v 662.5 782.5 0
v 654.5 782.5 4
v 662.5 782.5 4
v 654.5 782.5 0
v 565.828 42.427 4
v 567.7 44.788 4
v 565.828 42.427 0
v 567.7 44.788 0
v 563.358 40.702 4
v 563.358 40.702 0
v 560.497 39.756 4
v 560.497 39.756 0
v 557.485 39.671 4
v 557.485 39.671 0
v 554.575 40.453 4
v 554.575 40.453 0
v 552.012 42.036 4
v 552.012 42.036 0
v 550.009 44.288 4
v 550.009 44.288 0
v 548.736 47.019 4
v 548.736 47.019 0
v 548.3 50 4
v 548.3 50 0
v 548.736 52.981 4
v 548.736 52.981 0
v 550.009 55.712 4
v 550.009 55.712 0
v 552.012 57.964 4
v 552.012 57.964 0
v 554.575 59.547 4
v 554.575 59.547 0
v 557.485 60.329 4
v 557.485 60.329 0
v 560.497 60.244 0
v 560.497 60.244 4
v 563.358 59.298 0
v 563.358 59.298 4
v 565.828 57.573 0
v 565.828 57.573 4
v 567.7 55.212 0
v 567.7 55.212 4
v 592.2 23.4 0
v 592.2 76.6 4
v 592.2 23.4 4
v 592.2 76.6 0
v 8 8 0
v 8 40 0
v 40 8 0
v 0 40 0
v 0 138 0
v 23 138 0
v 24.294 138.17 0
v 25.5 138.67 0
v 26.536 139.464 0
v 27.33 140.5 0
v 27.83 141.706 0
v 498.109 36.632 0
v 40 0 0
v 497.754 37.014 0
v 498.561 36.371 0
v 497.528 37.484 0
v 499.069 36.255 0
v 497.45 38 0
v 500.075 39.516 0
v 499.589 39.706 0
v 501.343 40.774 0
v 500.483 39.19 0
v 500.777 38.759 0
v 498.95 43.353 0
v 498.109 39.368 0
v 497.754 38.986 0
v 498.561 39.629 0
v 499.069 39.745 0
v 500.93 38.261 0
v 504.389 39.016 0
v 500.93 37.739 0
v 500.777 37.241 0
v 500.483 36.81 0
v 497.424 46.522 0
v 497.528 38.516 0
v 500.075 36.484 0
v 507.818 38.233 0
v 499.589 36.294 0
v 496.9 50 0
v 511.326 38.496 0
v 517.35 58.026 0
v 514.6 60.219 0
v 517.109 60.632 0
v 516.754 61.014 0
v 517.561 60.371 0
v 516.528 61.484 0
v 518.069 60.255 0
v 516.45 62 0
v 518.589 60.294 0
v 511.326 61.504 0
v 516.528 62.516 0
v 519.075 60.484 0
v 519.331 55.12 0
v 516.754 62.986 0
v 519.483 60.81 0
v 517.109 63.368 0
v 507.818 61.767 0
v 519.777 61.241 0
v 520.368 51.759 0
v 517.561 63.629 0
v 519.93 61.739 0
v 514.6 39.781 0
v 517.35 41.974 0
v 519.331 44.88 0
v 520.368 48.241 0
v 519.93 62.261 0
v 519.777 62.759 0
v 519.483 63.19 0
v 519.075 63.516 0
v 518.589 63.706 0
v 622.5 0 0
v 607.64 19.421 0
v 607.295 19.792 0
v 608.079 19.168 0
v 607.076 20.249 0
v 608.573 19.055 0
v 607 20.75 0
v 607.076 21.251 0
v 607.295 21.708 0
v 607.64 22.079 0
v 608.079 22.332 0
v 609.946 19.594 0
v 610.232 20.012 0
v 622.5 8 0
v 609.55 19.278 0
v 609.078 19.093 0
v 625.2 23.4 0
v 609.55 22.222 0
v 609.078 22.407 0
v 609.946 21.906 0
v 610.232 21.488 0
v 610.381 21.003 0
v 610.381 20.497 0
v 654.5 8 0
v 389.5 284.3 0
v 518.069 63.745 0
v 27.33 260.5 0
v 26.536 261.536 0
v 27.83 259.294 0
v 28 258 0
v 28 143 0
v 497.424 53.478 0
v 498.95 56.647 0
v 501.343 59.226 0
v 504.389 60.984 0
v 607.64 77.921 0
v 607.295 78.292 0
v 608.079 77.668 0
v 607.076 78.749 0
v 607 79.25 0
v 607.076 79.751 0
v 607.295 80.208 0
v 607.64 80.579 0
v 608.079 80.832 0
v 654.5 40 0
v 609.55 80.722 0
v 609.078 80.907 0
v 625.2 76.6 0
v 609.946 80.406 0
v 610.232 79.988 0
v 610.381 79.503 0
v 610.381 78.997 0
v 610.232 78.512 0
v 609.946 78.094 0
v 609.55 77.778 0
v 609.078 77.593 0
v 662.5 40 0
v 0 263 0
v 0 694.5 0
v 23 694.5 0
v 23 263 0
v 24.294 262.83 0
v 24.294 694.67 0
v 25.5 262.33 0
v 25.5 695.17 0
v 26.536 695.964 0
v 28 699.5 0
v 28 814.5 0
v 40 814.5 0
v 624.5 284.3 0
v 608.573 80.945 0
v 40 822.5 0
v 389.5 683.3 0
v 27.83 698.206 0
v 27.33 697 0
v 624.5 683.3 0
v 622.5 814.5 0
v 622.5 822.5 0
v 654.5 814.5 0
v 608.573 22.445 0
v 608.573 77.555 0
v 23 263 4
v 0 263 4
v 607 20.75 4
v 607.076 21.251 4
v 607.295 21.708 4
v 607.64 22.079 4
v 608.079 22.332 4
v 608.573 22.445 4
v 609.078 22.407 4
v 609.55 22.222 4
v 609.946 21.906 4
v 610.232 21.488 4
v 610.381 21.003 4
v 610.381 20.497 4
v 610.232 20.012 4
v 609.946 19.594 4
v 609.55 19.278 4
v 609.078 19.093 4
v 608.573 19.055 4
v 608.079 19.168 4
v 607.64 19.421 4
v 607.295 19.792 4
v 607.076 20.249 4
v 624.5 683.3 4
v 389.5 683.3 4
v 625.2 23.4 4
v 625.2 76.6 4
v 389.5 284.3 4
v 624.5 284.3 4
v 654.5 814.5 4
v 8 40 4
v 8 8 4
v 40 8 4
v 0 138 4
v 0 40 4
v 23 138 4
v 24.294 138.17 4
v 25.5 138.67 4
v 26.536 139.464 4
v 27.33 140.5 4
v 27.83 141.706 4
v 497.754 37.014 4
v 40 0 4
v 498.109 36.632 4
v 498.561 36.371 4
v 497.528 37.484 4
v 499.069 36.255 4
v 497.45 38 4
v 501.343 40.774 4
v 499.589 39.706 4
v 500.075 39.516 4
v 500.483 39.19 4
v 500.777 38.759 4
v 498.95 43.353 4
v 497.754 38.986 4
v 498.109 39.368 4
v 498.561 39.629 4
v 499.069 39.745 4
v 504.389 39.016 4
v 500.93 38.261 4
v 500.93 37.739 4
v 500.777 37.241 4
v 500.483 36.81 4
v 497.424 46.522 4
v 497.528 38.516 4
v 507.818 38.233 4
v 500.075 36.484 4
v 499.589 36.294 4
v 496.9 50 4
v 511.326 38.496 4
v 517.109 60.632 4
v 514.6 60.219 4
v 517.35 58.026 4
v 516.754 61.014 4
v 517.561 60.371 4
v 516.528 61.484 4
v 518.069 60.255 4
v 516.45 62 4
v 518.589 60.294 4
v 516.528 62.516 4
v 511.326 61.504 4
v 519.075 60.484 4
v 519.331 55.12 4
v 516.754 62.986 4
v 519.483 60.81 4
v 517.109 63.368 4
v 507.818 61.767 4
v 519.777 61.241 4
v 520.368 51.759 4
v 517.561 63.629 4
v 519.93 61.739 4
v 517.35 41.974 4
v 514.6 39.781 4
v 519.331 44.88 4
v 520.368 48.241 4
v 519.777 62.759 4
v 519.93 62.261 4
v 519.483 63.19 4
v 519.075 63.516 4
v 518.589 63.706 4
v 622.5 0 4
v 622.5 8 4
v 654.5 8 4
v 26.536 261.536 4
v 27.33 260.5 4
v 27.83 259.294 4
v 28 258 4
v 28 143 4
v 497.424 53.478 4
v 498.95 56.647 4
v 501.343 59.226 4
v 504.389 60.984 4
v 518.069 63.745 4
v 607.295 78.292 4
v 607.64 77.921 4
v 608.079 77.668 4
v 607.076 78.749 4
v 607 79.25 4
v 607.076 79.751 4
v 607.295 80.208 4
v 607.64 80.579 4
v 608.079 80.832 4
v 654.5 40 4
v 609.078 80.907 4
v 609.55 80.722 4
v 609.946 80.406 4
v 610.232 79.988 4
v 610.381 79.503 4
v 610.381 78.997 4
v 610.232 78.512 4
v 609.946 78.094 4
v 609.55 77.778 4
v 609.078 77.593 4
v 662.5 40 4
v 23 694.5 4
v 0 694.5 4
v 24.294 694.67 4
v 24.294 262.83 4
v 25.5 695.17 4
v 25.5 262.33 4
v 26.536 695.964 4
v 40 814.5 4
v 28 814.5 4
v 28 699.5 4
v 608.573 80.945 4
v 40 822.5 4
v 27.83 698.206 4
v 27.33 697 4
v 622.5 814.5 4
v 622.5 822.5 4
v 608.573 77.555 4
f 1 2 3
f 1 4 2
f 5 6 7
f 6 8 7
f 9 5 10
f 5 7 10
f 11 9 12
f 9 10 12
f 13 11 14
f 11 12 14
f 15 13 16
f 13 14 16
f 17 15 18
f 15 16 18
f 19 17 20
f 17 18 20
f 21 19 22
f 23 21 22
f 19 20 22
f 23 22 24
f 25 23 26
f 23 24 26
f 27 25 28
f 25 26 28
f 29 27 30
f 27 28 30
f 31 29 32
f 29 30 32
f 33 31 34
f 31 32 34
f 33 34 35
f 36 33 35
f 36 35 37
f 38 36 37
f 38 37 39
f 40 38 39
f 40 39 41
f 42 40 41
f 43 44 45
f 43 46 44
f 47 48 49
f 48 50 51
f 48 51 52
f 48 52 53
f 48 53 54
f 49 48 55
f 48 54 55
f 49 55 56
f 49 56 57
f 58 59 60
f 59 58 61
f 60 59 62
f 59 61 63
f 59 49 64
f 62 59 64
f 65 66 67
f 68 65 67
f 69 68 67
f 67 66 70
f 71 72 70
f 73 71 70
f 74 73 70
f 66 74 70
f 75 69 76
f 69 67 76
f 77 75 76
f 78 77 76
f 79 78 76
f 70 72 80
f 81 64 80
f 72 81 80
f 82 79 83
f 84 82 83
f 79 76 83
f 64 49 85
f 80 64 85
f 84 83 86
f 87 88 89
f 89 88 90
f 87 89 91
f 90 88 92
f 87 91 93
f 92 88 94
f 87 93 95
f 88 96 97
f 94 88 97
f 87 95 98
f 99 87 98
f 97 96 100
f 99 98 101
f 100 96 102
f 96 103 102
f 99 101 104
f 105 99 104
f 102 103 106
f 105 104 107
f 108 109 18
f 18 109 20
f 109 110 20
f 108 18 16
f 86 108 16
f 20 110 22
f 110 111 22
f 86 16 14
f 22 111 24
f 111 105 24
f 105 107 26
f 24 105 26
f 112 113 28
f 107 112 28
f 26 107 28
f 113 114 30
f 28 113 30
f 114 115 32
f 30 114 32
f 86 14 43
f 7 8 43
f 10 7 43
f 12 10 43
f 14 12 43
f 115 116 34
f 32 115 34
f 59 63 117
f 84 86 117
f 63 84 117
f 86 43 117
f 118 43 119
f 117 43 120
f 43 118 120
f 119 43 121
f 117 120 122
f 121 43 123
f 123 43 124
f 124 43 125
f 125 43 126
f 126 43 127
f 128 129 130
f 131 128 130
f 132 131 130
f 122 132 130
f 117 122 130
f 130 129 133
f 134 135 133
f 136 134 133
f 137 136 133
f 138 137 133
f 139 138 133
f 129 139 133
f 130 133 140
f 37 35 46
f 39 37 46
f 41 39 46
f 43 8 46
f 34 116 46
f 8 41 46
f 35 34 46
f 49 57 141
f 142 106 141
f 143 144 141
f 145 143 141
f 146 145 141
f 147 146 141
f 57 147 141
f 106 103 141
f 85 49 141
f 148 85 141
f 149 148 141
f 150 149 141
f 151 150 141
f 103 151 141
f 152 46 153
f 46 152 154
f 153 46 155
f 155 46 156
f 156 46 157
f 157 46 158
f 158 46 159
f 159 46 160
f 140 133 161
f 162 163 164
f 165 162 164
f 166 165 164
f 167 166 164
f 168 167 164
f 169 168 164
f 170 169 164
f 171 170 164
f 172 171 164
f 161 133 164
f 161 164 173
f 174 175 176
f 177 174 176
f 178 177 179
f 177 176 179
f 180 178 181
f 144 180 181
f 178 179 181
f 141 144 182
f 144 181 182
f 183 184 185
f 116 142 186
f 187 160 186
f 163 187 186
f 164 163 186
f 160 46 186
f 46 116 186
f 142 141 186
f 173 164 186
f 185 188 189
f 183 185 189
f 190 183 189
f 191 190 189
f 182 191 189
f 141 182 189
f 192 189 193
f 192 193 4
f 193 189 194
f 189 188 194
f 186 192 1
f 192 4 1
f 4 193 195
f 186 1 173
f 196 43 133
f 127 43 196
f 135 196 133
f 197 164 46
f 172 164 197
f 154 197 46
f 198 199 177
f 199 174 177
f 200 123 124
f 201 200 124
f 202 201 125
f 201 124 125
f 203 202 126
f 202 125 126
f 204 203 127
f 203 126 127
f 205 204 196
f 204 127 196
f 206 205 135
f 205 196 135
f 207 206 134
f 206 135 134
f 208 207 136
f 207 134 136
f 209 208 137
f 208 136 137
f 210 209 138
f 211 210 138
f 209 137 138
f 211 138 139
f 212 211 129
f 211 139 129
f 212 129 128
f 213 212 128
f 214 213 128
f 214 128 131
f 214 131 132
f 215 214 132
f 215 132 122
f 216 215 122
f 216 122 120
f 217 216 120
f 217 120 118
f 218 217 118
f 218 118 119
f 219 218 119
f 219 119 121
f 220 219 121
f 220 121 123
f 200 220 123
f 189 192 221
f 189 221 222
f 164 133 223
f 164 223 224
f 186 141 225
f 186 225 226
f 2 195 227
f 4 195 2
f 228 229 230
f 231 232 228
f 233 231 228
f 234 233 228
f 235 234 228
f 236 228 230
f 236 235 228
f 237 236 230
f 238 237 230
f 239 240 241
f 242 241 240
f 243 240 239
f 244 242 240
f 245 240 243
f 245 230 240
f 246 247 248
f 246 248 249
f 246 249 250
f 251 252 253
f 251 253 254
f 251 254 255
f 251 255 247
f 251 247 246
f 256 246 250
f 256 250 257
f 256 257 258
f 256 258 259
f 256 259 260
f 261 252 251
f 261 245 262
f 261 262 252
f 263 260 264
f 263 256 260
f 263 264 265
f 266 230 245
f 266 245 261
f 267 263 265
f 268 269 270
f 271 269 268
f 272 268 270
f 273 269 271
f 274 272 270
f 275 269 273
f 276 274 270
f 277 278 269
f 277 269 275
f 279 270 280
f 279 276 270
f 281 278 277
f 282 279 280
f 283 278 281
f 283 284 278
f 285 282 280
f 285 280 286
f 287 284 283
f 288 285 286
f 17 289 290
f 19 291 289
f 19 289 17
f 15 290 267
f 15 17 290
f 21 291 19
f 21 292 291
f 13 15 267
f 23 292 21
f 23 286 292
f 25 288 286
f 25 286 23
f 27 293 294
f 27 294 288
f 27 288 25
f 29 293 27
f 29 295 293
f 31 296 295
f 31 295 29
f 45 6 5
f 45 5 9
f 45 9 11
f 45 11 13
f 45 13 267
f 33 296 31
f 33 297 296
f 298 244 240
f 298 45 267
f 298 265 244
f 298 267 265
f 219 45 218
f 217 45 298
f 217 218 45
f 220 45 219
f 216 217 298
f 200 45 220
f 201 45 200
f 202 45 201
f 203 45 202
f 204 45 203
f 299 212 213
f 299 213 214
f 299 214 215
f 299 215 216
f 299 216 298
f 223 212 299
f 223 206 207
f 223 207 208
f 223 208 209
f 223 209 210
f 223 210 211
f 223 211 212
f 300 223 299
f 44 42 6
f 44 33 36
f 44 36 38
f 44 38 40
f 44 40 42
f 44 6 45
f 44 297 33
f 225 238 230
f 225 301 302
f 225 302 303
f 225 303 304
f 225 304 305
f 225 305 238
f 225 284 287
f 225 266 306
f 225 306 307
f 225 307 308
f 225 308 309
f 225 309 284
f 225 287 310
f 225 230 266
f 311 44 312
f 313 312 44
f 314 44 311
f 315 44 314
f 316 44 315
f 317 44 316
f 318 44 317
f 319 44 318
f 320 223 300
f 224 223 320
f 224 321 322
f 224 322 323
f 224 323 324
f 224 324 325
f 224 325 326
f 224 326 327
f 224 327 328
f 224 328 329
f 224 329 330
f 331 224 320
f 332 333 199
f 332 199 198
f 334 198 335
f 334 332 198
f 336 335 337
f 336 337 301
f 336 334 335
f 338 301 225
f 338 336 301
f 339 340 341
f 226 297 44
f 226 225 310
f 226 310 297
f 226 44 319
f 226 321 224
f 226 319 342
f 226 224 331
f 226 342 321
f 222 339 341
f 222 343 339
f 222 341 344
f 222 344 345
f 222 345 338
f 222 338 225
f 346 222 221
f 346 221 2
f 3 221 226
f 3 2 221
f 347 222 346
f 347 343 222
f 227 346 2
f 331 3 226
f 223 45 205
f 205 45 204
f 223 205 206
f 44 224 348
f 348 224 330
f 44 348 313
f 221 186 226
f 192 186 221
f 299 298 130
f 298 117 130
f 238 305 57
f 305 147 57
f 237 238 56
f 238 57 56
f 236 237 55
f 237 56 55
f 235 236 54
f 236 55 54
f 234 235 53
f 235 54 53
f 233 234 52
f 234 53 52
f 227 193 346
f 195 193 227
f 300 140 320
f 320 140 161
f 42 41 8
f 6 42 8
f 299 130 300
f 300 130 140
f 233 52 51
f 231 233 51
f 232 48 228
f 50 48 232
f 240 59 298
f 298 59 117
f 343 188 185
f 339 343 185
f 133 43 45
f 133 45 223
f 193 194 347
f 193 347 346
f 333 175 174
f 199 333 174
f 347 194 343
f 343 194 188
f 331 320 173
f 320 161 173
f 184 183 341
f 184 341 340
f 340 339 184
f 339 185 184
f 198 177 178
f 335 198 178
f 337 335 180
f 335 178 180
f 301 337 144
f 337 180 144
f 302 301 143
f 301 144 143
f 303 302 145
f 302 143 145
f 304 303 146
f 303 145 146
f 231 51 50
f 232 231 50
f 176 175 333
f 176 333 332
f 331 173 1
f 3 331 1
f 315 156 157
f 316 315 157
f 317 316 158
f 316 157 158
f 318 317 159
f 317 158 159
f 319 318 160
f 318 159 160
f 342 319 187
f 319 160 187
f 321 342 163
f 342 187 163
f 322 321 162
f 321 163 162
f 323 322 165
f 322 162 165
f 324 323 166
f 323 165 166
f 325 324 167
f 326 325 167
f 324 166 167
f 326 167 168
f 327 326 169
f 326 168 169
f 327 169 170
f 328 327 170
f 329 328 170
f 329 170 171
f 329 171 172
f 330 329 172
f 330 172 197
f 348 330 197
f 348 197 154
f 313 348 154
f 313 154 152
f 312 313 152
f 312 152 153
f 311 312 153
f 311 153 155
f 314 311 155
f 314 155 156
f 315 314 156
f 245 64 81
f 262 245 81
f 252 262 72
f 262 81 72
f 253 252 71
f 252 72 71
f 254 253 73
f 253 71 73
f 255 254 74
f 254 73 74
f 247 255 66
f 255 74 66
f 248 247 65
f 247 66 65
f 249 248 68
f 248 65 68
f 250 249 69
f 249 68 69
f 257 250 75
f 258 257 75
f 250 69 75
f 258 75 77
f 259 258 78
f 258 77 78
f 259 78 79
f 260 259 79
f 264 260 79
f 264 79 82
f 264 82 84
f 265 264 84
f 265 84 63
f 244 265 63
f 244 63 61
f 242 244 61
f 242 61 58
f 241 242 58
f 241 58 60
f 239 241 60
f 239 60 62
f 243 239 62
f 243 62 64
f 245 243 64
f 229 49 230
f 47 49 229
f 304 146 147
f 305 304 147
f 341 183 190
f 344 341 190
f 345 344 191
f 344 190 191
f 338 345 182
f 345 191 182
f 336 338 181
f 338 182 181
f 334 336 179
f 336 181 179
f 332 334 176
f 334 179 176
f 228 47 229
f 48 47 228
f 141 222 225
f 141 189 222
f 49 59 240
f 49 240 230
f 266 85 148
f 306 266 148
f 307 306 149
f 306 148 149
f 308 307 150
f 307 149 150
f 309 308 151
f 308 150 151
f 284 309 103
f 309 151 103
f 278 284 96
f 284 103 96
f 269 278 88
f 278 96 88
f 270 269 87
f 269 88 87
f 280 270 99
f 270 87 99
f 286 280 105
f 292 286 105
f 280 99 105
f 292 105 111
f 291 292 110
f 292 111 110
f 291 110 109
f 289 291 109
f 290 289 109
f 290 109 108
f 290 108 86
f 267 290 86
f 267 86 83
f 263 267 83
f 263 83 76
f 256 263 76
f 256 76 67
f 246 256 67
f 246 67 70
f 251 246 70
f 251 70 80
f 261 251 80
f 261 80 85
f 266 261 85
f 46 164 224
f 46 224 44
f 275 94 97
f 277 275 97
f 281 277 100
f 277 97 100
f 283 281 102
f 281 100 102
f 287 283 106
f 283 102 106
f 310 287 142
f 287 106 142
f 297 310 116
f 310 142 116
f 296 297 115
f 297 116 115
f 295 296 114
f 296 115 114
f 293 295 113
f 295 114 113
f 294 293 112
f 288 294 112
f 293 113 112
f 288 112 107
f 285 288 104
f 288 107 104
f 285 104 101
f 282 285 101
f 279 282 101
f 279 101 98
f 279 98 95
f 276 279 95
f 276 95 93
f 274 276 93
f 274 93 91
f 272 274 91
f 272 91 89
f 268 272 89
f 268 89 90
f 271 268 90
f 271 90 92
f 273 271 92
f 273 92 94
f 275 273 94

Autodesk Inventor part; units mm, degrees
ref_plane "YZ Plane" through (0, 0, 0) normal (1, 0, 0) x (0, 1, 0)
ref_plane "XZ Plane" through (0, 0, 0) normal (0, 1, 0) x (-1, 0, 0)
ref_plane "XY Plane" through (0, 0, 0) normal (0, 0, 1) x (1, 0, 0)
sketch "Skizze1" plane through (0, 0, 0) normal (0, 0, 1) x (1, 0, 0)
  line L0 (0, 0) -> (662.5, 0)
  line L1 (662.5, 0) -> (662.5, 822.5)
  line L2 (662.5, 822.5) -> (0, 822.5)
  line L3 (0, 822.5) -> (0, 0)
  line L4 (0, 822.5) -> (40, 822.5)
  line L5 (40, 822.5) -> (40, 814.5)
  line L6 (40, 814.5) -> (0, 814.5)
  line L7 (0, 814.5) -> (0, 822.5)
  line L8 (0, 822.5) -> (8, 822.5)
  line L9 (8, 822.5) -> (8, 782.5)
  line L10 (8, 782.5) -> (0, 782.5)
  line L11 (0, 782.5) -> (0, 822.5)
  line L12 (0, 411.25) -> (662.5, 411.25) construction
  line L13 (331.25, 822.5) -> (331.25, 0) construction
  line L14 (0, 0) -> (40, 0)
  line L15 (40, 0) -> (40, 8)
  line L16 (40, 8) -> (0, 8)
  line L17 (0, 8) -> (0, 0)
  line L18 (0, 0) -> (8, 0)
  line L19 (8, 0) -> (8, 40)
  line L20 (8, 40) -> (0, 40)
  line L21 (0, 40) -> (0, 0)
  line L22 (662.5, 822.5) -> (662.5, 0)
  line L23 (662.5, 822.5) -> (622.5, 822.5)
  line L24 (622.5, 822.5) -> (622.5, 814.5)
  line L25 (622.5, 814.5) -> (662.5, 814.5)
  line L26 (662.5, 814.5) -> (662.5, 822.5)
  line L27 (662.5, 822.5) -> (654.5, 822.5)
  line L28 (654.5, 822.5) -> (654.5, 782.5)
  line L29 (654.5, 782.5) -> (662.5, 782.5)
  line L30 (662.5, 782.5) -> (662.5, 822.5)
  line L31 (662.5, 0) -> (654.5, 0)
  line L32 (662.5, 0) -> (622.5, 0)
  line L33 (622.5, 0) -> (622.5, 8)
  line L34 (622.5, 8) -> (662.5, 8)
  line L35 (654.5, 0) -> (654.5, 40)
  line L36 (662.5, 8) -> (662.5, 0)
  line L37 (654.5, 40) -> (662.5, 40)
  line L38 (662.5, 40) -> (662.5, 0)
  point P0 (662.5, 782.5)
  point P1 (654.5, 814.5)
  point P2 (8, 814.5)
  point P3 (0, 782.5)
  point P4 (0, 40)
  point P5 (8, 8)
  point P6 (654.5, 8)
  point P7 (662.5, 40)
  dimension "d0" = 662.5
  dimension "d1" = 822.5
  dimension "d2" = 40
  dimension "d3" = 8
  dimension "d4" = 8
  dimension "d5" = 40
extrude "Extrusion1" add sketch "Skizze1" along normal blind 4 contours L15 L16 L19 L20 L3 L10 L9 L6 L5 L2 L24 L25 L28 L29 L1 L37 L35 L34 L33 L0
sketch "Skizze2" plane through (0, 0, 0) normal (0, 0, -1) x (-1, 0, 0)
  line L0 (-624.5, 683.3) -> (-389.5, 683.3)
  line L1 (-389.5, 683.3) -> (-389.5, 284.3)
  line L2 (-389.5, 284.3) -> (-624.5, 284.3)
  line L3 (-624.5, 284.3) -> (-624.5, 683.3)
  line L4 (-654.5, 782.5) -> (-654.5, 814.5) projected
  line L5 (-654.5, 814.5) -> (-622.5, 814.5) projected
  point P0 (0, 0)
  dimension "d11" = 399
  dimension "d12" = 235
  dimension "d13" = 30
  dimension "d14" = 131.2
extrude "Extrusion2" cut sketch "Skizze2" against normal up to surface (4 mm away)
sketch "Skizze3" plane through (0, 0, 0) normal (0, 0, -1) x (-1, 0, 0)
  line L0 (0, 782.5) -> (0, 40) projected
  line L1 (-28, 814.5) -> (0, 814.5)
  line L2 (0, 814.5) -> (0, 694.5)
  line L3 (0, 694.5) -> (-23, 694.5)
  line L4 (-28, 699.5) -> (-28, 814.5)
  line L5 (0, 263) -> (-23, 263)
  line L6 (-28, 258) -> (-28, 143)
  line L7 (-23, 138) -> (0, 138)
  line L8 (0, 138) -> (0, 263)
  line L9 (-8, 40) -> (-8, 8) projected
  line L10 (-8, 8) -> (-40, 8) projected
  line L11 (-8, 814.5) -> (-8, 782.5) projected
  line L12 (-40, 814.5) -> (-8, 814.5) projected
  arc A0 (-28, 699.5) -> (-23, 694.5) centre (-23, 699.5) ccw
  arc A1 (-23, 263) -> (-28, 258) centre (-23, 258) ccw
  arc A2 (-28, 143) -> (-23, 138) centre (-23, 143) ccw
  point P0 (0, 0)
  point P1 (-28, 694.5)
  point P2 (-28, 263)
  point P3 (0, 138)
  point P4 (0, 686.15)
  point P5 (-28, 138)
  point P6 (0, 138)
  dimension "d17" = 20
  dimension "d19" = 20
  dimension "d20" = 0
  dimension "d21" = 120
  dimension "d61" = 130
  dimension "d62" = 120
  dimension "d63" = 5
  dimension "d64" = 5
extrude "Extrusion3" cut sketch "Skizze3" against normal up to surface (4 mm away)
sketch "Skizze4" plane through (0, 0, 0) normal (0, 0, -1) x (-1, 0, 0)
  line L0 (-619.5, 194.3) -> (-449.5, 194.3)
  line L1 (-444.5, 189.3) -> (-444.5, 159.3)
  line L2 (-449.5, 154.3) -> (-619.5, 154.3)
  line L3 (-624.5, 159.3) -> (-624.5, 189.3)
  line L4 (-624.5, 284.3) -> (-624.5, 683.3) projected
  line L5 (-389.5, 284.3) -> (-624.5, 284.3) projected
  arc A0 (-619.5, 194.3) -> (-624.5, 189.3) centre (-619.5, 189.3) ccw
  arc A1 (-624.5, 159.3) -> (-619.5, 154.3) centre (-619.5, 159.3) ccw
  arc A2 (-449.5, 154.3) -> (-444.5, 159.3) centre (-449.5, 159.3) ccw
  arc A3 (-444.5, 189.3) -> (-449.5, 194.3) centre (-449.5, 189.3) ccw
  point P0 (0, 0)
  dimension "d25" = 90
  dimension "d26" = 40
  dimension "d27" = 180
  dimension "d28" = 5
extrude "Extrusion4" cut sketch "Skizze4" against normal up to surface (4 mm away)
sketch "Skizze5" plane through (0, 0, 0) normal (0, 0, -1) x (-1, 0, 0)
  line L0 (-645.9539, 213.8422) -> (-402.4483, 213.8422)
  line L1 (-402.4483, 213.8422) -> (-402.4483, 126.1802)
  line L2 (-402.4483, 126.1802) -> (-645.9539, 126.1802)
  line L3 (-645.9539, 126.1802) -> (-645.9539, 213.8422)
  point P0 (0, 0)
extrude "Extrusion5" add sketch "Skizze5" against normal blind 4
sketch "Skizze6" plane through (0, 0, 0) normal (0, 0, -1) x (-1, 0, 0)
  line L0 (-625.2, 76.6) -> (-592.2, 76.6)
  line L1 (-592.2, 76.6) -> (-592.2, 23.4)
  line L2 (-592.2, 23.4) -> (-625.2, 23.4)
  line L3 (-625.2, 23.4) -> (-625.2, 76.6)
  circle A0 centre (-608.7, 79.25) radius 1.7
  circle A1 centre (-608.7, 20.75) radius 1.7
  line L4 (-40, 0) -> (-622.5, 0) projected
  line L5 (-662.5, 40) -> (-662.5, 782.5) projected
  arc A2 (-567.7, 44.7885) -> (-567.7, 55.2115) centre (-558.7, 50) ccw
  line L6 (-567.7, 55.2115) -> (-567.7, 44.7885)
  circle A3 centre (-508.7, 50) radius 11.8
  circle A4 centre (-518.2, 62) radius 1.75
  circle A5 centre (-499.2, 38) radius 1.75
  line L7 (-654.7, 10) -> (-654.7, 0) construction
  line L8 (-654.5, 8) -> (-654.5, 40) projected
  point P0 (0, 0)
  point P1 (-592.2, 50)
  point P2 (-625.2, 50)
  point P3 (-608.7, 23.4)
  dimension "d33" = 53.2
  dimension "d34" = 33
  dimension "d35" = 16.5
  dimension "d36" = 0
  dimension "d37" = 58.5
  dimension "d38" = 29.25
  dimension "d39" = 3.4
  dimension "d40" = 50
  dimension "d43" = 20.8
  dimension "d44" = 19.4
  dimension "d45" = 0
  dimension "d46" = 50
  dimension "d47" = 24
  dimension "d48" = 12
  dimension "d49" = 23.6
  dimension "d50" = 19
  dimension "d51" = 9.5
  dimension "d52" = 3.5
  dimension "d53" = 0
  dimension "d54" = 50
  dimension "d55" = 10
  dimension "d56" = 0
  dimension "d57" = 0.2
  dimension "d58" = 46
extrude "Extrusion6" cut sketch "Skizze6" against normal blind 4
equation "\"d35\" = 0.5 * d34"
equation "\"d38\" = 0.5 * d37"
equation "\"d48\" = 0.5 * d47"
equation "\"d51\" = 0.5 * d50"
equation "\"d54\" = d46"
properties part number "101.003.01_Abdeckung_HMI_links" material "PMMA-Kunststoff"
